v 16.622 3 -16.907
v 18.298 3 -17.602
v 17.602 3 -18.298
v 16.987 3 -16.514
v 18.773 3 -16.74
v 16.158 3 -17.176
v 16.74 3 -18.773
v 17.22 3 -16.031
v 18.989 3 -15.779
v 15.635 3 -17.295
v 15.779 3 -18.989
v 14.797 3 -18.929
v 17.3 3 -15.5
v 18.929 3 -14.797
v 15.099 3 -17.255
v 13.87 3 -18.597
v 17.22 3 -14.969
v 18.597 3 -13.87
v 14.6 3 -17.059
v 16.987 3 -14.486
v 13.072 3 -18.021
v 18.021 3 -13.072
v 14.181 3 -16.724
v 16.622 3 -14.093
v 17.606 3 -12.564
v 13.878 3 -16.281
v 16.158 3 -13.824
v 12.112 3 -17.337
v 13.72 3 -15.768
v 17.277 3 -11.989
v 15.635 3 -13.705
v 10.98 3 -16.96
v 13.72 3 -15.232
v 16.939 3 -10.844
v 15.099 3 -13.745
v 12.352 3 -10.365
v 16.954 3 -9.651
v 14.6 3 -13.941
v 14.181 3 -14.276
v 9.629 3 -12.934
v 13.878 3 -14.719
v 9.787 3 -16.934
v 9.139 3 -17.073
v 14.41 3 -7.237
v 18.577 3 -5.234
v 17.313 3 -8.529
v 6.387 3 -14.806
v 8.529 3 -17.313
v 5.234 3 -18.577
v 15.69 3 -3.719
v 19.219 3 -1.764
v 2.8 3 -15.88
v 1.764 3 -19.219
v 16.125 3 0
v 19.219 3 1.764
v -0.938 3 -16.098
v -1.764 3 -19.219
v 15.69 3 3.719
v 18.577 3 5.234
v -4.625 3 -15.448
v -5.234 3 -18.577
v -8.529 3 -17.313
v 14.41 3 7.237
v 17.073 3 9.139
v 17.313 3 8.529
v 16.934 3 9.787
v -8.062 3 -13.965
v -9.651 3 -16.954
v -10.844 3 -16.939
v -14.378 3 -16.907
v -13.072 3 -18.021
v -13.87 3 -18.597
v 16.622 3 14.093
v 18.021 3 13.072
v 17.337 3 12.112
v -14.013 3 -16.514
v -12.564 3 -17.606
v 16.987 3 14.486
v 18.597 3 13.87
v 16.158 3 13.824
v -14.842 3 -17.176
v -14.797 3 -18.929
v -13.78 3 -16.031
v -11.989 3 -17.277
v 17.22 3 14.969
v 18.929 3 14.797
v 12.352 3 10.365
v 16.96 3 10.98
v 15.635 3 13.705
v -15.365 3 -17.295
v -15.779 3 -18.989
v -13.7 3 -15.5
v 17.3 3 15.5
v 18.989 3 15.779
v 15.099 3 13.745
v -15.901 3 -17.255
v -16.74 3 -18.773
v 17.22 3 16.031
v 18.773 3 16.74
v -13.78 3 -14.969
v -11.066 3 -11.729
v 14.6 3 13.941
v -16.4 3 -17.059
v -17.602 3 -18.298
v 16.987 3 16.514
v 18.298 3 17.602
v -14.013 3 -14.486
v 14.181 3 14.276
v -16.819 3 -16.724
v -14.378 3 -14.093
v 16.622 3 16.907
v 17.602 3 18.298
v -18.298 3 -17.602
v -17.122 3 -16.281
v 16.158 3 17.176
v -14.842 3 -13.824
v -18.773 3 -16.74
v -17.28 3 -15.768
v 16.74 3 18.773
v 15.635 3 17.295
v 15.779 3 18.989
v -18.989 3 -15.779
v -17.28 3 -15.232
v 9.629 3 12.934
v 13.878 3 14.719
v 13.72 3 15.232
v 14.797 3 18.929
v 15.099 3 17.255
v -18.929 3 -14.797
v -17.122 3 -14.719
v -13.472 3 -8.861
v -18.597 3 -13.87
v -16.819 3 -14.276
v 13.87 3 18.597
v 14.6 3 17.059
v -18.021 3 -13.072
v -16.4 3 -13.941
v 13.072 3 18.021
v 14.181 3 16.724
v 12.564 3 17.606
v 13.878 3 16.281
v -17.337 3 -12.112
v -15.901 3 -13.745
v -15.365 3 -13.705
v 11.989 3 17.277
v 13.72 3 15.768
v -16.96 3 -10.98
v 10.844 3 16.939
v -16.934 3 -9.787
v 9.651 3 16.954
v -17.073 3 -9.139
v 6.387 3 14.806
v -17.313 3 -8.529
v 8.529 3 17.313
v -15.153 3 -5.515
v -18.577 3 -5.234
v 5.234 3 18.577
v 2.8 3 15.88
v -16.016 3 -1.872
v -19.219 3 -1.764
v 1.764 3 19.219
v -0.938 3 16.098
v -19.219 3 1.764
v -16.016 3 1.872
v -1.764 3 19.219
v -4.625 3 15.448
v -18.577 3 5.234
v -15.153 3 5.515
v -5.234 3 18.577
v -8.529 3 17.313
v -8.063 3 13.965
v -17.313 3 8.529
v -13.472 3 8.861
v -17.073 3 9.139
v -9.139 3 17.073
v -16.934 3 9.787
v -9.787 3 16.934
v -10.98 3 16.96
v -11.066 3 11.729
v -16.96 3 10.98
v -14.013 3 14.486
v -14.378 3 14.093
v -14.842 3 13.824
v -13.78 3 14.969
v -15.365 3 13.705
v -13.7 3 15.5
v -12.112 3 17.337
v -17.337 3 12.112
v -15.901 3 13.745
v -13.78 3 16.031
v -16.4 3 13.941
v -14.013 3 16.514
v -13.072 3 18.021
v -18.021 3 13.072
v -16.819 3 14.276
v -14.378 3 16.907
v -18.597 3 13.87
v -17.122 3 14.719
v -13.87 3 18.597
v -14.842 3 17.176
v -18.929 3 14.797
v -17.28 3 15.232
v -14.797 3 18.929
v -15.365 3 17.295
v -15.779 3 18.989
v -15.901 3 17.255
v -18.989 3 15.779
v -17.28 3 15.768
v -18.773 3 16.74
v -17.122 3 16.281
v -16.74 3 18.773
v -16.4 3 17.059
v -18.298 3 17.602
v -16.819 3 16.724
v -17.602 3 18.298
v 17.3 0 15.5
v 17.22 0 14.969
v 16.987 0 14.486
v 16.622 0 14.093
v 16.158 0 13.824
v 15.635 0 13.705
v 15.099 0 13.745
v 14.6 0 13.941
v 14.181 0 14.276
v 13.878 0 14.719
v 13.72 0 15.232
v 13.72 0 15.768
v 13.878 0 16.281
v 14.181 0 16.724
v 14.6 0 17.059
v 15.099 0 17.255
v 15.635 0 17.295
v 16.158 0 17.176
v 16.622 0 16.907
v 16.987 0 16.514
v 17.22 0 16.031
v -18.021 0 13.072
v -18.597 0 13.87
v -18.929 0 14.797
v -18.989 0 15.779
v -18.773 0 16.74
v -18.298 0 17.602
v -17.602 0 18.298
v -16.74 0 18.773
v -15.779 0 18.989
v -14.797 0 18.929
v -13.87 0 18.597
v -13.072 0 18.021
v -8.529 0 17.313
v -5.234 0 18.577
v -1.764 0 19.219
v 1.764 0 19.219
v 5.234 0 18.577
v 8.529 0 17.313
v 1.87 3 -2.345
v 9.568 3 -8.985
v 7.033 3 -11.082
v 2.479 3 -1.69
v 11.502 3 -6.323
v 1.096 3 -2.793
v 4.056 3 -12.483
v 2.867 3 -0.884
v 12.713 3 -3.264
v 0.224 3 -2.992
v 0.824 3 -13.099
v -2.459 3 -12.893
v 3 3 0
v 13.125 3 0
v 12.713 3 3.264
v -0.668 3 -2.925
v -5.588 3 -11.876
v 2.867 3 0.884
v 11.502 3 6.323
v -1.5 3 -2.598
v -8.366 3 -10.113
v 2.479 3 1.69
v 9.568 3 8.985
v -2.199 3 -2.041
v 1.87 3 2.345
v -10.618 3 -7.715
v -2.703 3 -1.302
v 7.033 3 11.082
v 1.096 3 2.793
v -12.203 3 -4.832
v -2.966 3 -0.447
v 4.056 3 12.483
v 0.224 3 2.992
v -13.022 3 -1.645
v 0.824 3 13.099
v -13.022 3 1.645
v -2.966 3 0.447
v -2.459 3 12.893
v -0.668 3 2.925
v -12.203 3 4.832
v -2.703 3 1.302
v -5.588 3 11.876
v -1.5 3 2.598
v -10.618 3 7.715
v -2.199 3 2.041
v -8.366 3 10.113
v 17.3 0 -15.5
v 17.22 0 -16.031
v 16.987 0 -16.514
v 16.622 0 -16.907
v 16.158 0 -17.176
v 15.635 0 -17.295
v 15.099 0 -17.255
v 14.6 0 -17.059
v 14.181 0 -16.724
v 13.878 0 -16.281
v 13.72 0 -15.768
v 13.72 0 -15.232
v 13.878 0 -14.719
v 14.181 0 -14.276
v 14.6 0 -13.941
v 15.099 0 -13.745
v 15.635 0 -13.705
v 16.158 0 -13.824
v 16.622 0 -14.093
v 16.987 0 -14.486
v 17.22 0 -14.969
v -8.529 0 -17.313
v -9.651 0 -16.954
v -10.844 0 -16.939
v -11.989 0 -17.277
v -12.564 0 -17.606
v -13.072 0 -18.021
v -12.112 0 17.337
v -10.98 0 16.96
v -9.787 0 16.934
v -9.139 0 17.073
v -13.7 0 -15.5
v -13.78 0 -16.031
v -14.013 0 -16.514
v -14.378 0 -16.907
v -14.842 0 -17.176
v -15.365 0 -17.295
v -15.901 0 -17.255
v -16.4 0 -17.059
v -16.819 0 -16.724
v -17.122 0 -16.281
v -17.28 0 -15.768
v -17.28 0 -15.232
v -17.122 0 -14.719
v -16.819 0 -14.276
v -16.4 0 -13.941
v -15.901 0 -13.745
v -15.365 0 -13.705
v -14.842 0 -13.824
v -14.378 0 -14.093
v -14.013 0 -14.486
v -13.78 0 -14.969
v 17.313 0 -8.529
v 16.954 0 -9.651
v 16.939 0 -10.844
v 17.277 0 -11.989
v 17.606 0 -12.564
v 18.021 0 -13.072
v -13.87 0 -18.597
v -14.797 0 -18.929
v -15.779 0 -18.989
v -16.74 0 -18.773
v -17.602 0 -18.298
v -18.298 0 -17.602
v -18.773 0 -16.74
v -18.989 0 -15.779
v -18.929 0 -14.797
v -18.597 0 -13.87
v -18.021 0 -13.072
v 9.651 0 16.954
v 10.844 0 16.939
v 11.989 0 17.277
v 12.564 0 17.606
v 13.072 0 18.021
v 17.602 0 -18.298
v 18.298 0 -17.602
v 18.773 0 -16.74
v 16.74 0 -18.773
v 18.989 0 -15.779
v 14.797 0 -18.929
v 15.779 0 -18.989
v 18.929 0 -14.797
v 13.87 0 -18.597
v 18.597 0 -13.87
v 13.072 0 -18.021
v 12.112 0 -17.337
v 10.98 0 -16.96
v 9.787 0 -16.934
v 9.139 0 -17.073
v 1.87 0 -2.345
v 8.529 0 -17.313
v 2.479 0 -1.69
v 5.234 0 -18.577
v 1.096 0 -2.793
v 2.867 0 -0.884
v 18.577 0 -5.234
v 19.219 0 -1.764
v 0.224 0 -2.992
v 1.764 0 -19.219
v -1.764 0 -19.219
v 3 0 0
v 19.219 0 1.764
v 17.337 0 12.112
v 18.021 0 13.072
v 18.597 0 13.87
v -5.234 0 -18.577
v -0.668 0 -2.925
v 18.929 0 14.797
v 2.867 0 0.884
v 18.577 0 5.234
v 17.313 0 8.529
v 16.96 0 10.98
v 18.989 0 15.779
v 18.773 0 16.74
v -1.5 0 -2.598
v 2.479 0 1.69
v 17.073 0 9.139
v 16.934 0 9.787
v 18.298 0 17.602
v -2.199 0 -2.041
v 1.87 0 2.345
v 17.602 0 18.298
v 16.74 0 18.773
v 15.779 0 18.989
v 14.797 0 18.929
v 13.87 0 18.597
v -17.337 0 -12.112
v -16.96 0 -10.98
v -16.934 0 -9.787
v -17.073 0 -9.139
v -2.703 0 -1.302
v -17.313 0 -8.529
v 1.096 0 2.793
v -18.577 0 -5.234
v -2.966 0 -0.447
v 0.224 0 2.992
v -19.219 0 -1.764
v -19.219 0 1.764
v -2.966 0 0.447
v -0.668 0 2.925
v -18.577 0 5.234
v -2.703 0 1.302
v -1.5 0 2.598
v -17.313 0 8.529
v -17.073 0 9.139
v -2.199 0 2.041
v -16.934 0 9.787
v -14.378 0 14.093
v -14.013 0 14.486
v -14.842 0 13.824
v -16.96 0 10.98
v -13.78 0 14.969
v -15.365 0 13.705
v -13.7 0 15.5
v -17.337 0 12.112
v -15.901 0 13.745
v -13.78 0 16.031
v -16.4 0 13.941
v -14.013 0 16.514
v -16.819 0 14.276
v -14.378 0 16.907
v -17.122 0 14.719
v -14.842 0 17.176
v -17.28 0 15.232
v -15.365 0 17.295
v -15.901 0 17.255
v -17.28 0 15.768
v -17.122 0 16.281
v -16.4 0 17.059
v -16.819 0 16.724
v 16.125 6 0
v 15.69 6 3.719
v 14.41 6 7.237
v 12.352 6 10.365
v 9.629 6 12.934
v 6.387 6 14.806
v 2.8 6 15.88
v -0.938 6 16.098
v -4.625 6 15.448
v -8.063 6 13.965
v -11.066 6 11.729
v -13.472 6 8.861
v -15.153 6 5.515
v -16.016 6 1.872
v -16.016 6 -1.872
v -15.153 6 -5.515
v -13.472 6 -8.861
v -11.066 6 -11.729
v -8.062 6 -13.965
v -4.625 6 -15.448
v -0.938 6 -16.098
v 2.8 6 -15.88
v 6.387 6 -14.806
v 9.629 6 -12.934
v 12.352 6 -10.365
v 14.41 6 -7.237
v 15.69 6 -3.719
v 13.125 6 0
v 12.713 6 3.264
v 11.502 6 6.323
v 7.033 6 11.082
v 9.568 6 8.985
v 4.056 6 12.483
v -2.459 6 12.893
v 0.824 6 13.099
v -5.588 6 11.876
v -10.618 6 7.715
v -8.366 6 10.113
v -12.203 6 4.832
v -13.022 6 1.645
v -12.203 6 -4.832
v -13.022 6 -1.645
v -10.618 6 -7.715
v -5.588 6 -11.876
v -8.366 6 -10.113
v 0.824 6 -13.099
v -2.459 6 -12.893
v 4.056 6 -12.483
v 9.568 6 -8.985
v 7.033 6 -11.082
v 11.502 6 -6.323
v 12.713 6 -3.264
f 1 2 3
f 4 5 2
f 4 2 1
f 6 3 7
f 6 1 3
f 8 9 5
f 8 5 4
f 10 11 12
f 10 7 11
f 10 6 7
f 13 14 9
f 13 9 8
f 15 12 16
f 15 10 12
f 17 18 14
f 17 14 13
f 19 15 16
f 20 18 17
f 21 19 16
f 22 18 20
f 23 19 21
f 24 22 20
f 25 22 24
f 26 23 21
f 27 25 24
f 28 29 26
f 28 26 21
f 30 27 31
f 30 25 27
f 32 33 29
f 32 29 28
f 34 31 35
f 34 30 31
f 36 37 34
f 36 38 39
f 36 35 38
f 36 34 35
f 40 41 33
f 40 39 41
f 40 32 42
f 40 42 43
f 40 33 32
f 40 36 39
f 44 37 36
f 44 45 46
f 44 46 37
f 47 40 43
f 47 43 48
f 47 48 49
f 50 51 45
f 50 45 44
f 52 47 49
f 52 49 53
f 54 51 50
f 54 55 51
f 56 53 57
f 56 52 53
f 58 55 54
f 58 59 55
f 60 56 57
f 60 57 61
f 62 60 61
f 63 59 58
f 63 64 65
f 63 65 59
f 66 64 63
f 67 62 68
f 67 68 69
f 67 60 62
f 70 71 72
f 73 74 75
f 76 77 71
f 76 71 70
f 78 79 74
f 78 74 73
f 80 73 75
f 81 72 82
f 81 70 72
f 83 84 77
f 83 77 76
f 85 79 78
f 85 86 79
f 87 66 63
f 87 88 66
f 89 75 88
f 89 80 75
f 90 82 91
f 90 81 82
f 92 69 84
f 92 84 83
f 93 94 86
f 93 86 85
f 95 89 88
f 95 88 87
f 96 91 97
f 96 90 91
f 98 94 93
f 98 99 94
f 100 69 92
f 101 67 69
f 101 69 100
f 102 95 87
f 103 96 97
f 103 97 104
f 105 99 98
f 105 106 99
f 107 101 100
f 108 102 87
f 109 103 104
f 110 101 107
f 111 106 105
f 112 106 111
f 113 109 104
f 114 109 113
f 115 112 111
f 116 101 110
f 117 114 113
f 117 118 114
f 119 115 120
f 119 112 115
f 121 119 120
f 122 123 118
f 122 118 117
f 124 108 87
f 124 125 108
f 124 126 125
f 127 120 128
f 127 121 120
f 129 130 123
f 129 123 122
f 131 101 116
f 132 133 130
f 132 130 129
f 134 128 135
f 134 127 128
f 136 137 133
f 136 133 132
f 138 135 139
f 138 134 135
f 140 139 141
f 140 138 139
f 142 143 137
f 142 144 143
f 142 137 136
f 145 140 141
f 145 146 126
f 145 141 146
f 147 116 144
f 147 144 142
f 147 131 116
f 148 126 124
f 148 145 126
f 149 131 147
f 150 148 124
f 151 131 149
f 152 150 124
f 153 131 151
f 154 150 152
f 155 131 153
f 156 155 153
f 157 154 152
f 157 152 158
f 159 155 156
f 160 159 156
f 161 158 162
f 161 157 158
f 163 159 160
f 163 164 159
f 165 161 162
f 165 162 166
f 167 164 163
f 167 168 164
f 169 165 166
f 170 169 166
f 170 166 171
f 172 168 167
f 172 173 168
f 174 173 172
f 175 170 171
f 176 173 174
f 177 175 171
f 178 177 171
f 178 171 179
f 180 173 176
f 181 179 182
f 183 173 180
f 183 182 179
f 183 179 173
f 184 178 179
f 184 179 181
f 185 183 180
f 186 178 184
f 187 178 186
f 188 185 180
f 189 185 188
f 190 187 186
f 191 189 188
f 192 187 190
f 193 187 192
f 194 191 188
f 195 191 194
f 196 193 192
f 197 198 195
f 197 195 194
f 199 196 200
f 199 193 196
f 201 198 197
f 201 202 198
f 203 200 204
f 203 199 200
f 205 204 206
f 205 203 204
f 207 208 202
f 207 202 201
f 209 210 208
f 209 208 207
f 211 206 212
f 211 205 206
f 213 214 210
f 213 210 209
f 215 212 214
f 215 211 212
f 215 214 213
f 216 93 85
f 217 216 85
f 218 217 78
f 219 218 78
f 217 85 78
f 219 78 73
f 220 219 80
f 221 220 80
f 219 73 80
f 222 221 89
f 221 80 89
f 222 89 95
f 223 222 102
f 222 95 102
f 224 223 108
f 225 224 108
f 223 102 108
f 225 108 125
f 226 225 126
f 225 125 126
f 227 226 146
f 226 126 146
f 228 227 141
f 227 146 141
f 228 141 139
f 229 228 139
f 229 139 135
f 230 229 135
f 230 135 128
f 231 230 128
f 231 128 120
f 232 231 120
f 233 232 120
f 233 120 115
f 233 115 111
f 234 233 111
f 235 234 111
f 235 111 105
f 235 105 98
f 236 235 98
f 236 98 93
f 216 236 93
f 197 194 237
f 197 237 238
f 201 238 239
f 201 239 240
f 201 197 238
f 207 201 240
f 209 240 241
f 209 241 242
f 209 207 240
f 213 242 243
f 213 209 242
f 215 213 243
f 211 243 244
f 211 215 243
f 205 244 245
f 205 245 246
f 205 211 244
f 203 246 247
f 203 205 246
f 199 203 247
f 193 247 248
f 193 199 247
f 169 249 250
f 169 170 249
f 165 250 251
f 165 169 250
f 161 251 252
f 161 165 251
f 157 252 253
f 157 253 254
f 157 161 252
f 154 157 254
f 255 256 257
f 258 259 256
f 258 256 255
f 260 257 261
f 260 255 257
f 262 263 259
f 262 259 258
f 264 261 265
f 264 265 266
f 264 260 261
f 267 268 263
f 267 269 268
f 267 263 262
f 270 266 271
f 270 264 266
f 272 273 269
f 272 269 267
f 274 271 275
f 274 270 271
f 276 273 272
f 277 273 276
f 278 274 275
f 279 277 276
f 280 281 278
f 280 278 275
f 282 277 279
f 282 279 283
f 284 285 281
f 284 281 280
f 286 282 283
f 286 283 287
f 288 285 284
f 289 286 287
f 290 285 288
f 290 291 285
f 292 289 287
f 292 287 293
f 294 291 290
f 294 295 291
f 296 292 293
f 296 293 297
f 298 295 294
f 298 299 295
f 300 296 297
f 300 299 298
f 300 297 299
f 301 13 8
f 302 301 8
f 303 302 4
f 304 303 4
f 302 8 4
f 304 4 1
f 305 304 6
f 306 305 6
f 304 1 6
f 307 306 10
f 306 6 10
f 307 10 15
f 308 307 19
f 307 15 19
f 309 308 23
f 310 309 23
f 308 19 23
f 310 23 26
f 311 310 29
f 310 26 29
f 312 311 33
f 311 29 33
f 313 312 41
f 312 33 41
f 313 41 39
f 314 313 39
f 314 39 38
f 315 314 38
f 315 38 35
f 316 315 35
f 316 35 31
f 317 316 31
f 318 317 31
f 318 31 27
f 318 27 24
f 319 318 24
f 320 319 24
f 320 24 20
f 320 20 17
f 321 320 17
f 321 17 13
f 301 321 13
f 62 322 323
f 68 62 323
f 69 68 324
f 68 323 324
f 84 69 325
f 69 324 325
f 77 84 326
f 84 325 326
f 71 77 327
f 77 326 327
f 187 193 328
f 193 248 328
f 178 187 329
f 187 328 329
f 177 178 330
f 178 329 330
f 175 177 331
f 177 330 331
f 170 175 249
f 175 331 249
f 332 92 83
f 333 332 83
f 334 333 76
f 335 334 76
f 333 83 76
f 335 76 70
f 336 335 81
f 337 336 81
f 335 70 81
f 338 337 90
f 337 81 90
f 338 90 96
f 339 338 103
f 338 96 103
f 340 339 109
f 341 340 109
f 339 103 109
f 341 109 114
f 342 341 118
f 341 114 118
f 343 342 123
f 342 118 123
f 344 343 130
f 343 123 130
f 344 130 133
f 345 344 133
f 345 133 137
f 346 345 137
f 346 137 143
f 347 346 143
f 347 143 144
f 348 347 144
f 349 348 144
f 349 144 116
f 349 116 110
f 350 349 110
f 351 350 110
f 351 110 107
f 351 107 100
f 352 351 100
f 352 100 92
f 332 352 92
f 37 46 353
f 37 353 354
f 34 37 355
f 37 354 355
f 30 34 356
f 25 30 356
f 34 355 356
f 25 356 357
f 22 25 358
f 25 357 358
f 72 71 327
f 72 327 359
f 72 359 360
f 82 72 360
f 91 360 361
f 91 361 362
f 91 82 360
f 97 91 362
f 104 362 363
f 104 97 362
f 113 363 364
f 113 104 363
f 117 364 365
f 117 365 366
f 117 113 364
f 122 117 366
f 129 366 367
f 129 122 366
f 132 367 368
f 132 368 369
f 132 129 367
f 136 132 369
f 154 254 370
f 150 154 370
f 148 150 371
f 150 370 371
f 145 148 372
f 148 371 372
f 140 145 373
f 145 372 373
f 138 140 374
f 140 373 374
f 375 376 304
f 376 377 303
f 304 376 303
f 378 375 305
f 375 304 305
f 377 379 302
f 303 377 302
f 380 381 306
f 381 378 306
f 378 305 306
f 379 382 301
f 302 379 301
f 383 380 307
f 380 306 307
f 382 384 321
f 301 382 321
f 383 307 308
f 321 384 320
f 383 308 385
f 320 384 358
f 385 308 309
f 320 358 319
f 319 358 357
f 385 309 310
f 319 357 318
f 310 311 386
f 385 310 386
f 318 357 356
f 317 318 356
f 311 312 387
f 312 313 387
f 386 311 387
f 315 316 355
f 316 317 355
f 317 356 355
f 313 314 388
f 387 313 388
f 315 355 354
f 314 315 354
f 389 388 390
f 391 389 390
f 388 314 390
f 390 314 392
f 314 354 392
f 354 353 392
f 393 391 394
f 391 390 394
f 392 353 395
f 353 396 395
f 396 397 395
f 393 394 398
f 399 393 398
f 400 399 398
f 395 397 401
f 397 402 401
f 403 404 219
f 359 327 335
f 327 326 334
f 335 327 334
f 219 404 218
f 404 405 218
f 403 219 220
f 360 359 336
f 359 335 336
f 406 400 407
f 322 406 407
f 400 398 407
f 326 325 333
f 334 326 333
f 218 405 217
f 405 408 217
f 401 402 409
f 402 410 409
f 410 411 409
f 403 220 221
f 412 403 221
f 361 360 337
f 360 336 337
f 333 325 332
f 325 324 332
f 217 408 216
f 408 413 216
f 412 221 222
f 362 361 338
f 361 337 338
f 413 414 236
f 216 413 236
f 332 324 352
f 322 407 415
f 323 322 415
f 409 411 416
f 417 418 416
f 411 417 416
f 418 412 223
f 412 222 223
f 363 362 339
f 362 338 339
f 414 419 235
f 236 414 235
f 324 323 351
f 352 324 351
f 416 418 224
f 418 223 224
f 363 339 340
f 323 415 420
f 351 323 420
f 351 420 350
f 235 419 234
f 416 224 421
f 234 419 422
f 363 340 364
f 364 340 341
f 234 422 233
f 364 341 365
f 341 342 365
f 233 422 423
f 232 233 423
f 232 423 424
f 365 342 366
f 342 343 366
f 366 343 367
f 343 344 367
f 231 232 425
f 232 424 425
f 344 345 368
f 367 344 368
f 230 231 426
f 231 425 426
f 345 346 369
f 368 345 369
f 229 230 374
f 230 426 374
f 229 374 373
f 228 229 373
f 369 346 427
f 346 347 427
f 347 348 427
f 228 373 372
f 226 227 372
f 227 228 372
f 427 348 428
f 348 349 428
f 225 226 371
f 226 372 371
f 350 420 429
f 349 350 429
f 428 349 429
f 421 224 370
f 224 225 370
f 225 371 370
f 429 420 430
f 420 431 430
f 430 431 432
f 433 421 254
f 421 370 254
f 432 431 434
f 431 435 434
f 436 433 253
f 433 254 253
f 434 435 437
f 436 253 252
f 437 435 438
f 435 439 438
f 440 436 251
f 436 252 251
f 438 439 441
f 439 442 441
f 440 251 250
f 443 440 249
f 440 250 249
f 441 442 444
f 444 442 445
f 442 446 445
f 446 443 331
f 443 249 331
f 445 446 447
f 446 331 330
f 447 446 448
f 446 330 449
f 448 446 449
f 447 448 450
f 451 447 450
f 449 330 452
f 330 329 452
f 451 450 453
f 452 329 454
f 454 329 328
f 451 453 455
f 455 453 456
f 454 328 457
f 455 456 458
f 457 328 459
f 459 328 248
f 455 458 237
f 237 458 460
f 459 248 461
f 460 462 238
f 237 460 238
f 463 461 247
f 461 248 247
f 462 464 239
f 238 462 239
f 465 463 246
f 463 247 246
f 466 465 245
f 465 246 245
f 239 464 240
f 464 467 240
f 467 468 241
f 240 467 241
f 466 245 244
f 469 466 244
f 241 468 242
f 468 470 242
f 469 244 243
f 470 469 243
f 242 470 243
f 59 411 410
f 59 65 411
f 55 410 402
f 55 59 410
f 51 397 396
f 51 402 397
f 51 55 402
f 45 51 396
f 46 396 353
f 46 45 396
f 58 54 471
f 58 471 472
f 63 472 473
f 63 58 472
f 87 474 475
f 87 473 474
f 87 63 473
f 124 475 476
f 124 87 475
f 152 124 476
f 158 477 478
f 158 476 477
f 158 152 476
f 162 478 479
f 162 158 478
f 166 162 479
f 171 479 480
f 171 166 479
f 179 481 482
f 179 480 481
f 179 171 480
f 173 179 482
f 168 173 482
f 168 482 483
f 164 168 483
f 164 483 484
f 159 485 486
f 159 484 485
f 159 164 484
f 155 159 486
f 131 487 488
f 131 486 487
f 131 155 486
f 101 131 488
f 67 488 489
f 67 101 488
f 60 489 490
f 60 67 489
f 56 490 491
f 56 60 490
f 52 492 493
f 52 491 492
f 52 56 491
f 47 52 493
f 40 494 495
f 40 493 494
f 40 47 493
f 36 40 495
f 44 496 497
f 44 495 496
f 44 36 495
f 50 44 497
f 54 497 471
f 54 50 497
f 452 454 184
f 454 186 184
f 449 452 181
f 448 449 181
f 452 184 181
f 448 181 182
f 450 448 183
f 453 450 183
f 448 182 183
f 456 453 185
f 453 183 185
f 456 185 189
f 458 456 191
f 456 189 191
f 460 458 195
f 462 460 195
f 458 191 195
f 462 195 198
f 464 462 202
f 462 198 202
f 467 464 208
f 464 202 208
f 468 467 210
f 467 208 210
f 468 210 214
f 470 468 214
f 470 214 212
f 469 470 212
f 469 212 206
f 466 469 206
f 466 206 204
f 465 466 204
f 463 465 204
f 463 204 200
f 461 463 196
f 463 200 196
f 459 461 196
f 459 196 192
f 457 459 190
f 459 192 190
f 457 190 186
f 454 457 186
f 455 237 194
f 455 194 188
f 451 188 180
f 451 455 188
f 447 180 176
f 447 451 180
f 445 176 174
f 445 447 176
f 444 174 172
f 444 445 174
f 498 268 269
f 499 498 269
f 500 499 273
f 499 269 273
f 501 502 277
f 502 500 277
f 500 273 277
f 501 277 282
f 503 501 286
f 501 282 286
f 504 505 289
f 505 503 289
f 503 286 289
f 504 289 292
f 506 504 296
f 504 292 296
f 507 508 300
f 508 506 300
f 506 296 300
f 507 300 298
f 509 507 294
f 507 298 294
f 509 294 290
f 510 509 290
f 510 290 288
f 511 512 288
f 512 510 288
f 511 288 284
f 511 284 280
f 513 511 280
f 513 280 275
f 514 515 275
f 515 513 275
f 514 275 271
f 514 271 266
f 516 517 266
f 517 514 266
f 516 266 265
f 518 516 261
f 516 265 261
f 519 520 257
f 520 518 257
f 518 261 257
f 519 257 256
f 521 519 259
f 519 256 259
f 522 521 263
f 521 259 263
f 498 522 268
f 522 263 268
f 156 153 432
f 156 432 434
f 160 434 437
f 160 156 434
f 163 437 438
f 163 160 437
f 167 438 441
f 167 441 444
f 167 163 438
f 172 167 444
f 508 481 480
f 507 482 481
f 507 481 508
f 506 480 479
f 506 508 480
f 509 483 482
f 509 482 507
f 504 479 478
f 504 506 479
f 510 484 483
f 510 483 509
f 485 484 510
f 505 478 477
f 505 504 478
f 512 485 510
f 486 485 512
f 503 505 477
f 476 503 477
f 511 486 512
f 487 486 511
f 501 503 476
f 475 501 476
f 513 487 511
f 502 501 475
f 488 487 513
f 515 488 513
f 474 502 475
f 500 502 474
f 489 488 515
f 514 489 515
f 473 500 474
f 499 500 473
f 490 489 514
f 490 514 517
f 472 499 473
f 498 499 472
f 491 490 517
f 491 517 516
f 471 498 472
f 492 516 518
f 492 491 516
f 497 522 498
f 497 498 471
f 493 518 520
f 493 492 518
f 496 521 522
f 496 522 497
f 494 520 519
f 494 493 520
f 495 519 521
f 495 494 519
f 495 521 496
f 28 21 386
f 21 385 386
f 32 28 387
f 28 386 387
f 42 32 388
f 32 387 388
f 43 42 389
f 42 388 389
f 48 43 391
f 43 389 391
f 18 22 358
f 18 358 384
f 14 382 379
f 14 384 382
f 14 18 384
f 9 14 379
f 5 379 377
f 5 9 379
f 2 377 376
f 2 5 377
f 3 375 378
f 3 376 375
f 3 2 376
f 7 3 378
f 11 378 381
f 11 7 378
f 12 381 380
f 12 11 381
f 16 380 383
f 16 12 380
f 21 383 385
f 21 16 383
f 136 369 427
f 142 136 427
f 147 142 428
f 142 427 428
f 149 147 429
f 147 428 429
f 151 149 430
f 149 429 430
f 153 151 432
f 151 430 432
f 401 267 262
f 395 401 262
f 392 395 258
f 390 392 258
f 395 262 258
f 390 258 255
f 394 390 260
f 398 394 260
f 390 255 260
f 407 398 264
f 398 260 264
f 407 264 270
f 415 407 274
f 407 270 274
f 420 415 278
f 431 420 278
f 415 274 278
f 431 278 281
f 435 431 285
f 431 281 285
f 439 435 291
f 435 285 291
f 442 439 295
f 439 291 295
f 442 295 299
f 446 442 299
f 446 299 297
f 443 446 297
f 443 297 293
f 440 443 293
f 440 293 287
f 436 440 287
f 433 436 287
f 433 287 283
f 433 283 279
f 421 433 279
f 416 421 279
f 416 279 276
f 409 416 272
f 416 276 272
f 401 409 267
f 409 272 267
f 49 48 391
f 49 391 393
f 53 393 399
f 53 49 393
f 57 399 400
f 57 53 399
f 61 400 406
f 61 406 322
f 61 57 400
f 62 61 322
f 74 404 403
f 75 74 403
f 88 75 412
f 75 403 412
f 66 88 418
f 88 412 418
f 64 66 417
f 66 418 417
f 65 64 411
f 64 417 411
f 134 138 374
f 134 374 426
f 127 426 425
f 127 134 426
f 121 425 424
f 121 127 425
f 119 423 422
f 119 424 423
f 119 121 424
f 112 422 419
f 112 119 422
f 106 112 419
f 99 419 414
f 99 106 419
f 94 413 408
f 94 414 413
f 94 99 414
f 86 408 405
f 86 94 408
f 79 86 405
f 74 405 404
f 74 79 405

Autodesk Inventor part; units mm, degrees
ref_plane "YZ Plane" through (0, 0, 0) normal (1, 0, 0) x (0, 1, 0)
ref_plane "XZ Plane" through (0, 0, 0) normal (0, 1, 0) x (-1, 0, 0)
ref_plane "XY Plane" through (0, 0, 0) normal (0, 0, 1) x (1, 0, 0)
sketch "Sketch1" plane through (0, 0, 0) normal (0, 1, 0) x (-1, 0, 0)
  line L0 (-21, 21) -> (21, 21)
  line L1 (21, 21) -> (21, -21)
  line L2 (21, -21) -> (-21, -21)
  line L3 (-21, -21) -> (-21, 21)
  line L4 (-21, 21) -> (21, -21) construction
  line L5 (21, 21) -> (-21, -21) construction
  point P0 (0, 0)
  dimension "d0" = 42
  dimension "d1" = 42
extrude "Extrusion1" add sketch "Sketch1" along normal blind 3
sketch "Sketch2" plane through (0, 3, 0) normal (0, 1, 0) x (1, 0, 0)
  circle A0 centre (0, 0) radius 3
  circle A1 centre (-15.5, -15.5) radius 1.8
  circle A2 centre (-15.5, 15.5) radius 1.8
  circle A3 centre (15.5, 15.5) radius 1.8
  circle A4 centre (15.5, -15.5) radius 1.8
  dimension "d4" = 6
  dimension "d5" = 3.6
  dimension "d6" = 31
  dimension "d7" = 15.5
  dimension "d8" = 15.5
  dimension "d9" = 31
extrude "Extrusion2" cut sketch "Sketch2" against normal blind 10
sketch "Sketch3" plane through (0, 3, 0) normal (0, 1, 0) x (1, 0, 0)
  circle A0 centre (-15.5, -15.5) radius 1.8 projected
  circle A1 centre (-15.5, -15.5) radius 3.5
  circle A2 centre (0, 0) radius 19.3
  line L0 (-13.0251, -17.9749) -> (-10.946, -15.8958)
  line L1 (-17.9749, -13.0251) -> (-15.8958, -10.946)
  circle A3 centre (15.5, -15.5) radius 1.8 projected
  circle A4 centre (15.5, -15.5) radius 3.5
  circle A5 centre (15.5, 15.5) radius 1.8 projected
  circle A6 centre (15.5, 15.5) radius 3.5
  circle A7 centre (-15.5, 15.5) radius 1.8 projected
  circle A8 centre (-15.5, 15.5) radius 3.5
  line L2 (13.0251, -17.9749) -> (10.946, -15.8958)
  line L3 (17.9749, -13.0251) -> (15.8958, -10.946)
  line L4 (13.0251, 17.9749) -> (10.946, 15.8958)
  line L5 (17.9749, 13.0251) -> (15.8958, 10.946)
  line L6 (-15.8958, 10.946) -> (-17.9749, 13.0251)
  line L7 (-10.946, 15.8958) -> (-13.0251, 17.9749)
  circle A9 centre (15.5, 15.5) radius 1.8 projected
  circle A10 centre (-15.5, 15.5) radius 1.8 projected
  circle A11 centre (15.5, -15.5) radius 1.8 projected
  circle A12 centre (-15.5, -15.5) radius 1.8 projected
  circle A13 centre (0, 0) radius 3 projected
  line L8 (-21, 21) -> (-21, -21) projected
  line L9 (-21, -21) -> (21, -21) projected
  line L10 (21, -21) -> (21, 21) projected
  line L11 (21, 21) -> (-21, 21) projected
  dimension "d13" = 38.6
  dimension "d12" = 7
extrude "Extrusion3" cut sketch "Sketch3" against normal blind 10 contours L11 L10 L9 L8
sketch "Sketch4" plane through (0, 3, 0) normal (0, 1, 0) x (1, 0, 0)
  circle A0 centre (0, 0) radius 3 projected
  circle A1 centre (0, 0) radius 16.125
  circle A2 centre (0, 0) radius 13.125
  dimension "d16" = 32.25
  dimension "d17" = 3
extrude "Extrusion4" add sketch "Sketch4" along normal blind 3 contours A1
fillet "Fillet1" radius 4 8 edges at (-15.8958, 1.5, -10.946) (-15.8958, 1.5, 10.946) (-10.946, 1.5, 15.8958) (10.946, 1.5, 15.8958) (15.8958, 1.5, 10.946) (15.8958, 1.5, -10.946) (10.946, 1.5, -15.8958) (-10.946, 1.5, -15.8958)
properties part number "Lid"
